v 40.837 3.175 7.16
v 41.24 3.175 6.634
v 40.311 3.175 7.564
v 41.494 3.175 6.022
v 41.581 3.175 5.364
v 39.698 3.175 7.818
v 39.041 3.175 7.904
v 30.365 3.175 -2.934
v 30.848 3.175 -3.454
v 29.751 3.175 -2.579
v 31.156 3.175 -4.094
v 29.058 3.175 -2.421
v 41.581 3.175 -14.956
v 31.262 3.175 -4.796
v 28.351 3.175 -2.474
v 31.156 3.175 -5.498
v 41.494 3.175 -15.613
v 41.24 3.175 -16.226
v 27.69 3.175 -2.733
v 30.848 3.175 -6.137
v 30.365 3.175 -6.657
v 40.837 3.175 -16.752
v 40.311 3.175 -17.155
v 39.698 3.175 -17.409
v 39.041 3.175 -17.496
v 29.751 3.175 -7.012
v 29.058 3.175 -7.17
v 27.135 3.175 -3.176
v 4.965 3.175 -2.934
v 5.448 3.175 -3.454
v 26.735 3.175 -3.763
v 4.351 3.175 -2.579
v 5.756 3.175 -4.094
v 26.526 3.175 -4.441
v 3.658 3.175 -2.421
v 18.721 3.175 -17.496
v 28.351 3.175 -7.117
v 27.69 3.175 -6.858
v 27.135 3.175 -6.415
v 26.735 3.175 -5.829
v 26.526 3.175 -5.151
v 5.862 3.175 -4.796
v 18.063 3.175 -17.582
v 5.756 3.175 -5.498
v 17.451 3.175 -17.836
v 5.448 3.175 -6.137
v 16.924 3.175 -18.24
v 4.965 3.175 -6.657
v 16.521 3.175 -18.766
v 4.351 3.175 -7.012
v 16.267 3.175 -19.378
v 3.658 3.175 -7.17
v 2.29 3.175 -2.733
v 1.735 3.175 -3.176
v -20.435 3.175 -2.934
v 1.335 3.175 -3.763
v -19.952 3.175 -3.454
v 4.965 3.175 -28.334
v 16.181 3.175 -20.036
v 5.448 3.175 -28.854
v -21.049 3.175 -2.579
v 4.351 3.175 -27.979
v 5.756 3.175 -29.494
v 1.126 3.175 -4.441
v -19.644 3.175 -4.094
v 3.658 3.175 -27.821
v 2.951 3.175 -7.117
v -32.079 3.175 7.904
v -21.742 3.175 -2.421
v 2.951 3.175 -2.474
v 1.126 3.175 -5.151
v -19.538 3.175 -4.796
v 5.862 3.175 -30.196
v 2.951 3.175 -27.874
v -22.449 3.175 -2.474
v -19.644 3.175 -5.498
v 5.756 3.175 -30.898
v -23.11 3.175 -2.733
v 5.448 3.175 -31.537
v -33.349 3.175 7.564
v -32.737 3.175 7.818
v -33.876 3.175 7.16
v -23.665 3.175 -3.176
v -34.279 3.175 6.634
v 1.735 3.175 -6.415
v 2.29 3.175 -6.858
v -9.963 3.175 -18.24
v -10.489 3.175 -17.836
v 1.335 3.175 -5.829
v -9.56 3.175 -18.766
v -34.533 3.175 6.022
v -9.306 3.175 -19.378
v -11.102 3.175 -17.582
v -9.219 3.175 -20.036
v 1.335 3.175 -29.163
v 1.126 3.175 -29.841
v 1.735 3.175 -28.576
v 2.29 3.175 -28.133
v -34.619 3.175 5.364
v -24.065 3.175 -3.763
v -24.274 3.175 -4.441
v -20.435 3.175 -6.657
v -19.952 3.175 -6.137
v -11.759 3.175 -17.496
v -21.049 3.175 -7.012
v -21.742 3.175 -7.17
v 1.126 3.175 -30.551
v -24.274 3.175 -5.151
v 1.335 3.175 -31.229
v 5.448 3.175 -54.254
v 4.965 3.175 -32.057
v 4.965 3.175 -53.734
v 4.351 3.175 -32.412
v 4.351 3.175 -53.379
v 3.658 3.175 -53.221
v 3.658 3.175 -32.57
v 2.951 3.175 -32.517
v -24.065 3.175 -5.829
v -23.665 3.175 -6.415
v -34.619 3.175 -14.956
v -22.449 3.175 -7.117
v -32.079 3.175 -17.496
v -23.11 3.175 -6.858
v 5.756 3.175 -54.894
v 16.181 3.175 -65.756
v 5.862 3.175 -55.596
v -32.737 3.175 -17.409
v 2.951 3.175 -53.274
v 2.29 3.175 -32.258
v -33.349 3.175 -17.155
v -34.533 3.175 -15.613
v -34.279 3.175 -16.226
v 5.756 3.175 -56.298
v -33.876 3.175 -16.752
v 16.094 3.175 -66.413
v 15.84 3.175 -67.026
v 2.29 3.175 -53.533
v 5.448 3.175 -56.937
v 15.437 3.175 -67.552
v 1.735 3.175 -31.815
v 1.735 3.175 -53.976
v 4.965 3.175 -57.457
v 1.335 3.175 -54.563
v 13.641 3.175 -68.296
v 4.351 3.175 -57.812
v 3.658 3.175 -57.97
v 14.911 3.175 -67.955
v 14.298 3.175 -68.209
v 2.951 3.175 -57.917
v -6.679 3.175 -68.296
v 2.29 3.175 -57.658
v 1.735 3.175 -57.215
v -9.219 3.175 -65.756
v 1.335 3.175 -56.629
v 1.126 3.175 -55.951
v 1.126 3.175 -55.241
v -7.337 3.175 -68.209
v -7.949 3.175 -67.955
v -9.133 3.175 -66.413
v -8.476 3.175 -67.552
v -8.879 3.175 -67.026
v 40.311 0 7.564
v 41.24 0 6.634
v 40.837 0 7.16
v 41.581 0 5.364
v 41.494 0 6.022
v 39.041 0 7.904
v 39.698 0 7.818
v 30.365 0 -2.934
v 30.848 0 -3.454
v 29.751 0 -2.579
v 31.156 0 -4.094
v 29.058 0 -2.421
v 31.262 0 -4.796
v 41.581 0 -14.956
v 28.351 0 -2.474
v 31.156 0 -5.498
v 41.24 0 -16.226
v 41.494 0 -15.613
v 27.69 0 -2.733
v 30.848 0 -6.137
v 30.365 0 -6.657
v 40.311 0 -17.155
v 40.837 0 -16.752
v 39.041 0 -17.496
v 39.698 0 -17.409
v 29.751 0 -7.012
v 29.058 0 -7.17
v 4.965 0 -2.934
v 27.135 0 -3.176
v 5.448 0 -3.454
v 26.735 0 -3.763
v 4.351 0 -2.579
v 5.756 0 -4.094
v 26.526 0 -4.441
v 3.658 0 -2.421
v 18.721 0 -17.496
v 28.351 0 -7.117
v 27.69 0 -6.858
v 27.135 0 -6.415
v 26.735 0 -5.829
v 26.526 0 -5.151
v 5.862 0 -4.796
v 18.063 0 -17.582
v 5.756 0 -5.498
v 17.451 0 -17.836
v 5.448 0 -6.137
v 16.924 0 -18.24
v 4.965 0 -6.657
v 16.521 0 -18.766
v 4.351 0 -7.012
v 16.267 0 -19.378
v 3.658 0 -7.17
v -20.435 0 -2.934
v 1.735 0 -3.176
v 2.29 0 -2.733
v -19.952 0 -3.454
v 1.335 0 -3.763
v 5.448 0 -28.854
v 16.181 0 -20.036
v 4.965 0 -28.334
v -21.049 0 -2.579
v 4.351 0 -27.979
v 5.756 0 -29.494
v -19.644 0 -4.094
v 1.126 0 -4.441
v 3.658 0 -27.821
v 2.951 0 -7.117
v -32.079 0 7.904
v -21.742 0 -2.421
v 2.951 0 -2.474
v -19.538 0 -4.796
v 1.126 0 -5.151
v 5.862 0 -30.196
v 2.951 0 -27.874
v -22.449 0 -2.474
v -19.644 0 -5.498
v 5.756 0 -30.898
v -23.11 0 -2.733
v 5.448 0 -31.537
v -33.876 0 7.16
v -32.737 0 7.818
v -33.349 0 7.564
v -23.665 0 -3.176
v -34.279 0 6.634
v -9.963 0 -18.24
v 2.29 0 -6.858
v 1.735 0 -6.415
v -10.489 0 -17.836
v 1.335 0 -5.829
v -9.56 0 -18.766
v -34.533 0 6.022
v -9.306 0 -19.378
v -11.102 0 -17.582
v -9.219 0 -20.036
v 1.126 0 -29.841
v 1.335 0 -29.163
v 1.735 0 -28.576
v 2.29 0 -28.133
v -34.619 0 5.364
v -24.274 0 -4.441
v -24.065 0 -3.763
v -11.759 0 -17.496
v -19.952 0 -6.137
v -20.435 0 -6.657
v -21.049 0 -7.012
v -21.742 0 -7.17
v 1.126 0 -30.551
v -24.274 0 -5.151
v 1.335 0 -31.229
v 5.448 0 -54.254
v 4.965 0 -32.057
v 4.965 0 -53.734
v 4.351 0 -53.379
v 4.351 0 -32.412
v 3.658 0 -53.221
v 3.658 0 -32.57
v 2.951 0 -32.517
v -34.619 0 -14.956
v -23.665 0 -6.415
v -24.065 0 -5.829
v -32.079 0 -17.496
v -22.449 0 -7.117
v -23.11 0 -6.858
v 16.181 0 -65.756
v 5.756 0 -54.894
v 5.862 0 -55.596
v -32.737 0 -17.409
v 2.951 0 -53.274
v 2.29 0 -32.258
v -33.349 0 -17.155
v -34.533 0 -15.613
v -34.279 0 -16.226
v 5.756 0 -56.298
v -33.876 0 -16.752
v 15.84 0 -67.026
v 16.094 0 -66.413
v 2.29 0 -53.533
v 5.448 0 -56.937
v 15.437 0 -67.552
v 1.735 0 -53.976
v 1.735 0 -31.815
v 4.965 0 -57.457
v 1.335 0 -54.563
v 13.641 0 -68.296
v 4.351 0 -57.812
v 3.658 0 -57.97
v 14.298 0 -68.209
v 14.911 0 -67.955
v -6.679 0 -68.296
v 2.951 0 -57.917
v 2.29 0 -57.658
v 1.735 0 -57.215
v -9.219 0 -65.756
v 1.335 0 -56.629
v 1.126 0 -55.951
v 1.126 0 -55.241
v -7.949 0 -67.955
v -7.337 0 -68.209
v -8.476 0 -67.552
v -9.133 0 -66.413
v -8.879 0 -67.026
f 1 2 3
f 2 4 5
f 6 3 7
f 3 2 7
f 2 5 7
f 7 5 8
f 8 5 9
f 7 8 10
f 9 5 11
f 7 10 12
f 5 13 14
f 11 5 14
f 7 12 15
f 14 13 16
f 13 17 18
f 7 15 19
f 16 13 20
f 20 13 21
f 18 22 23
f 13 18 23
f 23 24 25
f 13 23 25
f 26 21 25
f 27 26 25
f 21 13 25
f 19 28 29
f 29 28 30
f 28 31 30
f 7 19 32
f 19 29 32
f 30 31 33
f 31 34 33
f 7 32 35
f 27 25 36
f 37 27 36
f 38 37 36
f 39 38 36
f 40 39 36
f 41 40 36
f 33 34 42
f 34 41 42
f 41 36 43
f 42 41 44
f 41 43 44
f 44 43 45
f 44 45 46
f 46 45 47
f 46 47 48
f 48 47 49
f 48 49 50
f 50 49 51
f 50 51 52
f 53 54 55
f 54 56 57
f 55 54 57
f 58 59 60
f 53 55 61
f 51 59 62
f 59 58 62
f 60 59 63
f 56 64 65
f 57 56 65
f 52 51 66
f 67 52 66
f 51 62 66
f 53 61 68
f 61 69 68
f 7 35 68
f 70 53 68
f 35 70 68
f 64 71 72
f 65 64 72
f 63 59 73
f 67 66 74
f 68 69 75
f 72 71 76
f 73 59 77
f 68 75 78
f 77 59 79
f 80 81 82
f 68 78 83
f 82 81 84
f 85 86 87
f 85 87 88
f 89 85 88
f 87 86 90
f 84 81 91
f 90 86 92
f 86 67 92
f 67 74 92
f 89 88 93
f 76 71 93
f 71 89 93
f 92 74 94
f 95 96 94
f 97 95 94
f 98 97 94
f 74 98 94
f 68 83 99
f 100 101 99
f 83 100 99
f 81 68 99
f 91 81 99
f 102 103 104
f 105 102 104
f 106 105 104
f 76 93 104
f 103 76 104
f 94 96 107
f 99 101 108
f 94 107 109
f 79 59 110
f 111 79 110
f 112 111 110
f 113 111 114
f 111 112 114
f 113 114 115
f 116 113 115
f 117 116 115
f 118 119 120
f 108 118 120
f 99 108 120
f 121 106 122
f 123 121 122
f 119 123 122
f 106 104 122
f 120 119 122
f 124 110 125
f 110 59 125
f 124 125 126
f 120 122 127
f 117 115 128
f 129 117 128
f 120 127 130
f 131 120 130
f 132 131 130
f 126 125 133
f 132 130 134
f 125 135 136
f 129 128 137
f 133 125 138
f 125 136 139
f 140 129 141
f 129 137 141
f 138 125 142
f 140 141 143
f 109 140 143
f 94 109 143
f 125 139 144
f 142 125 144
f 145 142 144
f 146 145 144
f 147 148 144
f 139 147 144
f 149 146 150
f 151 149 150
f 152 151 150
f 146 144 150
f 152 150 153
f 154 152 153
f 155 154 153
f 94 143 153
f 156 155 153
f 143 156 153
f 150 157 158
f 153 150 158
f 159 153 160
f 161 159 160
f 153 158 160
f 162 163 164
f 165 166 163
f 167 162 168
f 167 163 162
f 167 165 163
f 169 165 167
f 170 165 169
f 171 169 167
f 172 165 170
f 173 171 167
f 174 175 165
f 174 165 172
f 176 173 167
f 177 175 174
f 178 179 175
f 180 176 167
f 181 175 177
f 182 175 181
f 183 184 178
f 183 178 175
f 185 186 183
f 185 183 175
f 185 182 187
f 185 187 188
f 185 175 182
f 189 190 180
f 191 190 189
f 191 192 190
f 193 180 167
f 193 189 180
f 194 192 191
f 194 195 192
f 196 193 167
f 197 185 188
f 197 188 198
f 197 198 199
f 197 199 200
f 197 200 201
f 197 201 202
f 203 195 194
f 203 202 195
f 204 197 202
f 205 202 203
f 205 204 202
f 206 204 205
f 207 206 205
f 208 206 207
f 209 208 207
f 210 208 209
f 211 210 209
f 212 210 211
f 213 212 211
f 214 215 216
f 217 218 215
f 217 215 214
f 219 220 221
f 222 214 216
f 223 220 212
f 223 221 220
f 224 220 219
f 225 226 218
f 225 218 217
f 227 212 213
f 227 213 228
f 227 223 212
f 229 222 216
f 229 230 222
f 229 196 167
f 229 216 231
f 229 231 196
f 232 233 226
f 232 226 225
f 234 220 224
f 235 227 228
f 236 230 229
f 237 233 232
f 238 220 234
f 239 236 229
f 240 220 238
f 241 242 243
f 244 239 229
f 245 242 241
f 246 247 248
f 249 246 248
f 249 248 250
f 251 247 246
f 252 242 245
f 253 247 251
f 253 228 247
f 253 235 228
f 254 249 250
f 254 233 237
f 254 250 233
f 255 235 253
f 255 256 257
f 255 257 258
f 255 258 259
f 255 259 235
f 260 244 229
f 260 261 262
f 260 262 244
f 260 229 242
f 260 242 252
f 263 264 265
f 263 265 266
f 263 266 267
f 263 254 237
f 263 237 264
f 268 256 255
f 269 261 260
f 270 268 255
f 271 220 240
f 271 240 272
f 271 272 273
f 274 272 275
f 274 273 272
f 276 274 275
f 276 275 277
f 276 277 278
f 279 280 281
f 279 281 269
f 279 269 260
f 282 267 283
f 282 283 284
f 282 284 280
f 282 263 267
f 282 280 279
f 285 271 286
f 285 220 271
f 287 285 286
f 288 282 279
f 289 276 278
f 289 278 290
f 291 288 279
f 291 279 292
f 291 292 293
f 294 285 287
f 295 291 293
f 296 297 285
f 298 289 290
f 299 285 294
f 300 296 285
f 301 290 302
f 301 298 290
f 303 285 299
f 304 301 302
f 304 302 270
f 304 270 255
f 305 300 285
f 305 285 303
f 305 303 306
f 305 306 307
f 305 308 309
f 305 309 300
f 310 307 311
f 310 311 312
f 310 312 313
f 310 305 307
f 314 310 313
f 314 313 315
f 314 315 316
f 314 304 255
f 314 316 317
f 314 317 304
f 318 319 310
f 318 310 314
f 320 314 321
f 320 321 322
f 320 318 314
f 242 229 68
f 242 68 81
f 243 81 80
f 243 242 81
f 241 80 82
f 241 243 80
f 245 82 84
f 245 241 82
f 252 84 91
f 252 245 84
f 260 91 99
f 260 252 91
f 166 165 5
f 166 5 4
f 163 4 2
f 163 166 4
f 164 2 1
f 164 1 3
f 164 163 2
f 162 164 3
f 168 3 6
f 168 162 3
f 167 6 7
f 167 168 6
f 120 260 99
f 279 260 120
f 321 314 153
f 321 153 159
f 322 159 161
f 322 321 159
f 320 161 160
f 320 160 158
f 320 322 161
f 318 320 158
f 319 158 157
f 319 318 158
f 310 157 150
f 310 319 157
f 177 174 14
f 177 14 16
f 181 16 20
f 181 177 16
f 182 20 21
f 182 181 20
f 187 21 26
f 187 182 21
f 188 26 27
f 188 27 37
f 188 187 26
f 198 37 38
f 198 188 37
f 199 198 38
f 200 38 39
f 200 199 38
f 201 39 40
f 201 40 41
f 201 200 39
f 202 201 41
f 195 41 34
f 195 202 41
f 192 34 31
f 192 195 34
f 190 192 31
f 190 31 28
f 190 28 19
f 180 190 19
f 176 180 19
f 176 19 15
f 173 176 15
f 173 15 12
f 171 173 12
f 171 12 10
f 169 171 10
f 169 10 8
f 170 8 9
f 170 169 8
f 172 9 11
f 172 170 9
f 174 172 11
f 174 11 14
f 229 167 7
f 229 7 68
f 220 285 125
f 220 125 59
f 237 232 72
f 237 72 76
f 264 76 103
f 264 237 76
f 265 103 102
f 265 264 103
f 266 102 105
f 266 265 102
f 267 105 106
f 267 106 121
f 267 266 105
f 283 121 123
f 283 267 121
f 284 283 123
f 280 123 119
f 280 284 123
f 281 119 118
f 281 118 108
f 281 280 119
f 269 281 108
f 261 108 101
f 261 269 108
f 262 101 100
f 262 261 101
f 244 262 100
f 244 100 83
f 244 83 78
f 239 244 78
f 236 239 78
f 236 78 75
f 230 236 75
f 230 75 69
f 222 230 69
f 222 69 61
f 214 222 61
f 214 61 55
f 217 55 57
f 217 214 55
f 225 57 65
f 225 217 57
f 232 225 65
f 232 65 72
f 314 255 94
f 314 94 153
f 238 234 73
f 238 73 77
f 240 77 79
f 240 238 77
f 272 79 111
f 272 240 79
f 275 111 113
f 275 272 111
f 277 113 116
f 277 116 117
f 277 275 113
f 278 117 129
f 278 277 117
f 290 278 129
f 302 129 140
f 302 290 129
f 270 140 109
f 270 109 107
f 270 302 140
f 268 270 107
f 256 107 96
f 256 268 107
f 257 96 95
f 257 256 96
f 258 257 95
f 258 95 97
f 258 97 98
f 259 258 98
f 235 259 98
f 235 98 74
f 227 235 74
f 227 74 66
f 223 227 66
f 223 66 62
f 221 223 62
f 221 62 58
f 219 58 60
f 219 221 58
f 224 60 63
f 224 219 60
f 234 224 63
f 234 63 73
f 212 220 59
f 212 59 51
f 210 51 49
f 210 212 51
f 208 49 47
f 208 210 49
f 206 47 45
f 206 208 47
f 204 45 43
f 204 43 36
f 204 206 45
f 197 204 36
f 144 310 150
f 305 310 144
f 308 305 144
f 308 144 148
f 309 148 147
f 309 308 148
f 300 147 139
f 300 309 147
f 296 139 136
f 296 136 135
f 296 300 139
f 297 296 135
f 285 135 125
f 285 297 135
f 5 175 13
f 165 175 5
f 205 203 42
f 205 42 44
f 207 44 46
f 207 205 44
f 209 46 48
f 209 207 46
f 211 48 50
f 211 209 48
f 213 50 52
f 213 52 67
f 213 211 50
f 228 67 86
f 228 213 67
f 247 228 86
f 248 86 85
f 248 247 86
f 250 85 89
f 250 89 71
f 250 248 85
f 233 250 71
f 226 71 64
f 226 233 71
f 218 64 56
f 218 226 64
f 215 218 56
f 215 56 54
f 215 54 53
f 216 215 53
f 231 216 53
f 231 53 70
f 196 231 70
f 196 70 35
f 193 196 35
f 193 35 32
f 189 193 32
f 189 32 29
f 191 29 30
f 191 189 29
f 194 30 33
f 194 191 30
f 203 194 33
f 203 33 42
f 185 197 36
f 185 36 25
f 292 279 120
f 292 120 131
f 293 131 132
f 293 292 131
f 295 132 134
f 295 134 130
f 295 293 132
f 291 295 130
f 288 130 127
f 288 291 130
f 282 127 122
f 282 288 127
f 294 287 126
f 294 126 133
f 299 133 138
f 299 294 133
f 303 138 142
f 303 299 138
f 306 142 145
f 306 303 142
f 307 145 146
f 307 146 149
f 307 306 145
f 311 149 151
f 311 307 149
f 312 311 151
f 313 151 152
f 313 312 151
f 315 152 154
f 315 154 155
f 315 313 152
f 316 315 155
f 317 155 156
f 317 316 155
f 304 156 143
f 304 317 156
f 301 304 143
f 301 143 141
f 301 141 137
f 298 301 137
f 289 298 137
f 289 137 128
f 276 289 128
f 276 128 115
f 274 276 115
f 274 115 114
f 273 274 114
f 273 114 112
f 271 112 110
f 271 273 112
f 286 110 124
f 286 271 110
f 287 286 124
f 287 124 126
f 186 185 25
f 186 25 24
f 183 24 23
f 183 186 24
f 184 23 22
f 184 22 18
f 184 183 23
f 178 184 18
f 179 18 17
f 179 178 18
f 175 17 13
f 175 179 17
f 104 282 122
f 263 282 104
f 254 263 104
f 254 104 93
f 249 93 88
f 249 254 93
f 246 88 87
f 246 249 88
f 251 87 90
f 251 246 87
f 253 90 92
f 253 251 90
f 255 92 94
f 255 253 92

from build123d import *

# Parameters (mm, degrees)
SKETCH1_R           = 2.38125
BOSS_EXTRUDE1_DEPTH = 3.175


with BuildPart() as part:
    # Sketch1 → Boss-Extrude1 (new body)
    with BuildSketch(Plane(origin=(0, 0, 0), x_dir=(1, 0, 0), z_dir=(0, 1, 0))):
        with BuildLine():
            Line((18.720543933, 17.495711297), (39.040543933, 17.495711297))
            ThreePointArc((39.040543933, 17.495711297), (40.836595157, 16.751762521), (41.580543933, 14.955711297))
            Line((41.580543933, 14.955711297), (41.580543933, -5.364288703))
            ThreePointArc((41.580543933, -5.364288703), (40.836595157, -7.160339927), (39.040543933, -7.904288703))
            Line((39.040543933, -7.904288703), (-32.079456067, -7.904288703))
            ThreePointArc((-32.079456067, -7.904288703), (-33.875507291, -7.160339927), (-34.619456067, -5.364288703))
            Line((-34.619456067, -5.364288703), (-34.619456067, 14.955711297))
            ThreePointArc((-34.619456067, 14.955711297), (-33.875507291, 16.751762521), (-32.079456067, 17.495711297))
            Line((-32.079456067, 17.495711297), (-11.759456067, 17.495711297))
            ThreePointArc((-11.759456067, 17.495711297), (-9.963404843, 18.239660073), (-9.219456067, 20.035711297))
            Line((-9.219456067, 20.035711297), (-9.219456067, 65.755711297))
            ThreePointArc((-9.219456067, 65.755711297), (-8.475507291, 67.551762521), (-6.679456067, 68.295711297))
            Line((-6.679456067, 68.295711297), (13.640543933, 68.295711297))
            ThreePointArc((13.640543933, 68.295711297), (15.436595157, 67.551762521), (16.180543933, 65.755711297))
            Line((16.180543933, 65.755711297), (16.180543933, 20.035711297))
            ThreePointArc((16.180543933, 20.035711297), (16.924492709, 18.239660073), (18.720543933, 17.495711297))
        make_face()
        with Locations((3.480543933, 4.795711297)):
            Circle(SKETCH1_R, mode=Mode.SUBTRACT)
        with Locations((-21.919456067, 4.795711297)):
            Circle(SKETCH1_R, mode=Mode.SUBTRACT)
        with Locations((28.880543933, 4.795711297)):
            Circle(SKETCH1_R, mode=Mode.SUBTRACT)
        with Locations((3.480543933, 30.195711297)):
            Circle(SKETCH1_R, mode=Mode.SUBTRACT)
        with Locations((3.480543933, 55.595711297)):
            Circle(SKETCH1_R, mode=Mode.SUBTRACT)
    extrude(amount=BOSS_EXTRUDE1_DEPTH)


solid = part.part
